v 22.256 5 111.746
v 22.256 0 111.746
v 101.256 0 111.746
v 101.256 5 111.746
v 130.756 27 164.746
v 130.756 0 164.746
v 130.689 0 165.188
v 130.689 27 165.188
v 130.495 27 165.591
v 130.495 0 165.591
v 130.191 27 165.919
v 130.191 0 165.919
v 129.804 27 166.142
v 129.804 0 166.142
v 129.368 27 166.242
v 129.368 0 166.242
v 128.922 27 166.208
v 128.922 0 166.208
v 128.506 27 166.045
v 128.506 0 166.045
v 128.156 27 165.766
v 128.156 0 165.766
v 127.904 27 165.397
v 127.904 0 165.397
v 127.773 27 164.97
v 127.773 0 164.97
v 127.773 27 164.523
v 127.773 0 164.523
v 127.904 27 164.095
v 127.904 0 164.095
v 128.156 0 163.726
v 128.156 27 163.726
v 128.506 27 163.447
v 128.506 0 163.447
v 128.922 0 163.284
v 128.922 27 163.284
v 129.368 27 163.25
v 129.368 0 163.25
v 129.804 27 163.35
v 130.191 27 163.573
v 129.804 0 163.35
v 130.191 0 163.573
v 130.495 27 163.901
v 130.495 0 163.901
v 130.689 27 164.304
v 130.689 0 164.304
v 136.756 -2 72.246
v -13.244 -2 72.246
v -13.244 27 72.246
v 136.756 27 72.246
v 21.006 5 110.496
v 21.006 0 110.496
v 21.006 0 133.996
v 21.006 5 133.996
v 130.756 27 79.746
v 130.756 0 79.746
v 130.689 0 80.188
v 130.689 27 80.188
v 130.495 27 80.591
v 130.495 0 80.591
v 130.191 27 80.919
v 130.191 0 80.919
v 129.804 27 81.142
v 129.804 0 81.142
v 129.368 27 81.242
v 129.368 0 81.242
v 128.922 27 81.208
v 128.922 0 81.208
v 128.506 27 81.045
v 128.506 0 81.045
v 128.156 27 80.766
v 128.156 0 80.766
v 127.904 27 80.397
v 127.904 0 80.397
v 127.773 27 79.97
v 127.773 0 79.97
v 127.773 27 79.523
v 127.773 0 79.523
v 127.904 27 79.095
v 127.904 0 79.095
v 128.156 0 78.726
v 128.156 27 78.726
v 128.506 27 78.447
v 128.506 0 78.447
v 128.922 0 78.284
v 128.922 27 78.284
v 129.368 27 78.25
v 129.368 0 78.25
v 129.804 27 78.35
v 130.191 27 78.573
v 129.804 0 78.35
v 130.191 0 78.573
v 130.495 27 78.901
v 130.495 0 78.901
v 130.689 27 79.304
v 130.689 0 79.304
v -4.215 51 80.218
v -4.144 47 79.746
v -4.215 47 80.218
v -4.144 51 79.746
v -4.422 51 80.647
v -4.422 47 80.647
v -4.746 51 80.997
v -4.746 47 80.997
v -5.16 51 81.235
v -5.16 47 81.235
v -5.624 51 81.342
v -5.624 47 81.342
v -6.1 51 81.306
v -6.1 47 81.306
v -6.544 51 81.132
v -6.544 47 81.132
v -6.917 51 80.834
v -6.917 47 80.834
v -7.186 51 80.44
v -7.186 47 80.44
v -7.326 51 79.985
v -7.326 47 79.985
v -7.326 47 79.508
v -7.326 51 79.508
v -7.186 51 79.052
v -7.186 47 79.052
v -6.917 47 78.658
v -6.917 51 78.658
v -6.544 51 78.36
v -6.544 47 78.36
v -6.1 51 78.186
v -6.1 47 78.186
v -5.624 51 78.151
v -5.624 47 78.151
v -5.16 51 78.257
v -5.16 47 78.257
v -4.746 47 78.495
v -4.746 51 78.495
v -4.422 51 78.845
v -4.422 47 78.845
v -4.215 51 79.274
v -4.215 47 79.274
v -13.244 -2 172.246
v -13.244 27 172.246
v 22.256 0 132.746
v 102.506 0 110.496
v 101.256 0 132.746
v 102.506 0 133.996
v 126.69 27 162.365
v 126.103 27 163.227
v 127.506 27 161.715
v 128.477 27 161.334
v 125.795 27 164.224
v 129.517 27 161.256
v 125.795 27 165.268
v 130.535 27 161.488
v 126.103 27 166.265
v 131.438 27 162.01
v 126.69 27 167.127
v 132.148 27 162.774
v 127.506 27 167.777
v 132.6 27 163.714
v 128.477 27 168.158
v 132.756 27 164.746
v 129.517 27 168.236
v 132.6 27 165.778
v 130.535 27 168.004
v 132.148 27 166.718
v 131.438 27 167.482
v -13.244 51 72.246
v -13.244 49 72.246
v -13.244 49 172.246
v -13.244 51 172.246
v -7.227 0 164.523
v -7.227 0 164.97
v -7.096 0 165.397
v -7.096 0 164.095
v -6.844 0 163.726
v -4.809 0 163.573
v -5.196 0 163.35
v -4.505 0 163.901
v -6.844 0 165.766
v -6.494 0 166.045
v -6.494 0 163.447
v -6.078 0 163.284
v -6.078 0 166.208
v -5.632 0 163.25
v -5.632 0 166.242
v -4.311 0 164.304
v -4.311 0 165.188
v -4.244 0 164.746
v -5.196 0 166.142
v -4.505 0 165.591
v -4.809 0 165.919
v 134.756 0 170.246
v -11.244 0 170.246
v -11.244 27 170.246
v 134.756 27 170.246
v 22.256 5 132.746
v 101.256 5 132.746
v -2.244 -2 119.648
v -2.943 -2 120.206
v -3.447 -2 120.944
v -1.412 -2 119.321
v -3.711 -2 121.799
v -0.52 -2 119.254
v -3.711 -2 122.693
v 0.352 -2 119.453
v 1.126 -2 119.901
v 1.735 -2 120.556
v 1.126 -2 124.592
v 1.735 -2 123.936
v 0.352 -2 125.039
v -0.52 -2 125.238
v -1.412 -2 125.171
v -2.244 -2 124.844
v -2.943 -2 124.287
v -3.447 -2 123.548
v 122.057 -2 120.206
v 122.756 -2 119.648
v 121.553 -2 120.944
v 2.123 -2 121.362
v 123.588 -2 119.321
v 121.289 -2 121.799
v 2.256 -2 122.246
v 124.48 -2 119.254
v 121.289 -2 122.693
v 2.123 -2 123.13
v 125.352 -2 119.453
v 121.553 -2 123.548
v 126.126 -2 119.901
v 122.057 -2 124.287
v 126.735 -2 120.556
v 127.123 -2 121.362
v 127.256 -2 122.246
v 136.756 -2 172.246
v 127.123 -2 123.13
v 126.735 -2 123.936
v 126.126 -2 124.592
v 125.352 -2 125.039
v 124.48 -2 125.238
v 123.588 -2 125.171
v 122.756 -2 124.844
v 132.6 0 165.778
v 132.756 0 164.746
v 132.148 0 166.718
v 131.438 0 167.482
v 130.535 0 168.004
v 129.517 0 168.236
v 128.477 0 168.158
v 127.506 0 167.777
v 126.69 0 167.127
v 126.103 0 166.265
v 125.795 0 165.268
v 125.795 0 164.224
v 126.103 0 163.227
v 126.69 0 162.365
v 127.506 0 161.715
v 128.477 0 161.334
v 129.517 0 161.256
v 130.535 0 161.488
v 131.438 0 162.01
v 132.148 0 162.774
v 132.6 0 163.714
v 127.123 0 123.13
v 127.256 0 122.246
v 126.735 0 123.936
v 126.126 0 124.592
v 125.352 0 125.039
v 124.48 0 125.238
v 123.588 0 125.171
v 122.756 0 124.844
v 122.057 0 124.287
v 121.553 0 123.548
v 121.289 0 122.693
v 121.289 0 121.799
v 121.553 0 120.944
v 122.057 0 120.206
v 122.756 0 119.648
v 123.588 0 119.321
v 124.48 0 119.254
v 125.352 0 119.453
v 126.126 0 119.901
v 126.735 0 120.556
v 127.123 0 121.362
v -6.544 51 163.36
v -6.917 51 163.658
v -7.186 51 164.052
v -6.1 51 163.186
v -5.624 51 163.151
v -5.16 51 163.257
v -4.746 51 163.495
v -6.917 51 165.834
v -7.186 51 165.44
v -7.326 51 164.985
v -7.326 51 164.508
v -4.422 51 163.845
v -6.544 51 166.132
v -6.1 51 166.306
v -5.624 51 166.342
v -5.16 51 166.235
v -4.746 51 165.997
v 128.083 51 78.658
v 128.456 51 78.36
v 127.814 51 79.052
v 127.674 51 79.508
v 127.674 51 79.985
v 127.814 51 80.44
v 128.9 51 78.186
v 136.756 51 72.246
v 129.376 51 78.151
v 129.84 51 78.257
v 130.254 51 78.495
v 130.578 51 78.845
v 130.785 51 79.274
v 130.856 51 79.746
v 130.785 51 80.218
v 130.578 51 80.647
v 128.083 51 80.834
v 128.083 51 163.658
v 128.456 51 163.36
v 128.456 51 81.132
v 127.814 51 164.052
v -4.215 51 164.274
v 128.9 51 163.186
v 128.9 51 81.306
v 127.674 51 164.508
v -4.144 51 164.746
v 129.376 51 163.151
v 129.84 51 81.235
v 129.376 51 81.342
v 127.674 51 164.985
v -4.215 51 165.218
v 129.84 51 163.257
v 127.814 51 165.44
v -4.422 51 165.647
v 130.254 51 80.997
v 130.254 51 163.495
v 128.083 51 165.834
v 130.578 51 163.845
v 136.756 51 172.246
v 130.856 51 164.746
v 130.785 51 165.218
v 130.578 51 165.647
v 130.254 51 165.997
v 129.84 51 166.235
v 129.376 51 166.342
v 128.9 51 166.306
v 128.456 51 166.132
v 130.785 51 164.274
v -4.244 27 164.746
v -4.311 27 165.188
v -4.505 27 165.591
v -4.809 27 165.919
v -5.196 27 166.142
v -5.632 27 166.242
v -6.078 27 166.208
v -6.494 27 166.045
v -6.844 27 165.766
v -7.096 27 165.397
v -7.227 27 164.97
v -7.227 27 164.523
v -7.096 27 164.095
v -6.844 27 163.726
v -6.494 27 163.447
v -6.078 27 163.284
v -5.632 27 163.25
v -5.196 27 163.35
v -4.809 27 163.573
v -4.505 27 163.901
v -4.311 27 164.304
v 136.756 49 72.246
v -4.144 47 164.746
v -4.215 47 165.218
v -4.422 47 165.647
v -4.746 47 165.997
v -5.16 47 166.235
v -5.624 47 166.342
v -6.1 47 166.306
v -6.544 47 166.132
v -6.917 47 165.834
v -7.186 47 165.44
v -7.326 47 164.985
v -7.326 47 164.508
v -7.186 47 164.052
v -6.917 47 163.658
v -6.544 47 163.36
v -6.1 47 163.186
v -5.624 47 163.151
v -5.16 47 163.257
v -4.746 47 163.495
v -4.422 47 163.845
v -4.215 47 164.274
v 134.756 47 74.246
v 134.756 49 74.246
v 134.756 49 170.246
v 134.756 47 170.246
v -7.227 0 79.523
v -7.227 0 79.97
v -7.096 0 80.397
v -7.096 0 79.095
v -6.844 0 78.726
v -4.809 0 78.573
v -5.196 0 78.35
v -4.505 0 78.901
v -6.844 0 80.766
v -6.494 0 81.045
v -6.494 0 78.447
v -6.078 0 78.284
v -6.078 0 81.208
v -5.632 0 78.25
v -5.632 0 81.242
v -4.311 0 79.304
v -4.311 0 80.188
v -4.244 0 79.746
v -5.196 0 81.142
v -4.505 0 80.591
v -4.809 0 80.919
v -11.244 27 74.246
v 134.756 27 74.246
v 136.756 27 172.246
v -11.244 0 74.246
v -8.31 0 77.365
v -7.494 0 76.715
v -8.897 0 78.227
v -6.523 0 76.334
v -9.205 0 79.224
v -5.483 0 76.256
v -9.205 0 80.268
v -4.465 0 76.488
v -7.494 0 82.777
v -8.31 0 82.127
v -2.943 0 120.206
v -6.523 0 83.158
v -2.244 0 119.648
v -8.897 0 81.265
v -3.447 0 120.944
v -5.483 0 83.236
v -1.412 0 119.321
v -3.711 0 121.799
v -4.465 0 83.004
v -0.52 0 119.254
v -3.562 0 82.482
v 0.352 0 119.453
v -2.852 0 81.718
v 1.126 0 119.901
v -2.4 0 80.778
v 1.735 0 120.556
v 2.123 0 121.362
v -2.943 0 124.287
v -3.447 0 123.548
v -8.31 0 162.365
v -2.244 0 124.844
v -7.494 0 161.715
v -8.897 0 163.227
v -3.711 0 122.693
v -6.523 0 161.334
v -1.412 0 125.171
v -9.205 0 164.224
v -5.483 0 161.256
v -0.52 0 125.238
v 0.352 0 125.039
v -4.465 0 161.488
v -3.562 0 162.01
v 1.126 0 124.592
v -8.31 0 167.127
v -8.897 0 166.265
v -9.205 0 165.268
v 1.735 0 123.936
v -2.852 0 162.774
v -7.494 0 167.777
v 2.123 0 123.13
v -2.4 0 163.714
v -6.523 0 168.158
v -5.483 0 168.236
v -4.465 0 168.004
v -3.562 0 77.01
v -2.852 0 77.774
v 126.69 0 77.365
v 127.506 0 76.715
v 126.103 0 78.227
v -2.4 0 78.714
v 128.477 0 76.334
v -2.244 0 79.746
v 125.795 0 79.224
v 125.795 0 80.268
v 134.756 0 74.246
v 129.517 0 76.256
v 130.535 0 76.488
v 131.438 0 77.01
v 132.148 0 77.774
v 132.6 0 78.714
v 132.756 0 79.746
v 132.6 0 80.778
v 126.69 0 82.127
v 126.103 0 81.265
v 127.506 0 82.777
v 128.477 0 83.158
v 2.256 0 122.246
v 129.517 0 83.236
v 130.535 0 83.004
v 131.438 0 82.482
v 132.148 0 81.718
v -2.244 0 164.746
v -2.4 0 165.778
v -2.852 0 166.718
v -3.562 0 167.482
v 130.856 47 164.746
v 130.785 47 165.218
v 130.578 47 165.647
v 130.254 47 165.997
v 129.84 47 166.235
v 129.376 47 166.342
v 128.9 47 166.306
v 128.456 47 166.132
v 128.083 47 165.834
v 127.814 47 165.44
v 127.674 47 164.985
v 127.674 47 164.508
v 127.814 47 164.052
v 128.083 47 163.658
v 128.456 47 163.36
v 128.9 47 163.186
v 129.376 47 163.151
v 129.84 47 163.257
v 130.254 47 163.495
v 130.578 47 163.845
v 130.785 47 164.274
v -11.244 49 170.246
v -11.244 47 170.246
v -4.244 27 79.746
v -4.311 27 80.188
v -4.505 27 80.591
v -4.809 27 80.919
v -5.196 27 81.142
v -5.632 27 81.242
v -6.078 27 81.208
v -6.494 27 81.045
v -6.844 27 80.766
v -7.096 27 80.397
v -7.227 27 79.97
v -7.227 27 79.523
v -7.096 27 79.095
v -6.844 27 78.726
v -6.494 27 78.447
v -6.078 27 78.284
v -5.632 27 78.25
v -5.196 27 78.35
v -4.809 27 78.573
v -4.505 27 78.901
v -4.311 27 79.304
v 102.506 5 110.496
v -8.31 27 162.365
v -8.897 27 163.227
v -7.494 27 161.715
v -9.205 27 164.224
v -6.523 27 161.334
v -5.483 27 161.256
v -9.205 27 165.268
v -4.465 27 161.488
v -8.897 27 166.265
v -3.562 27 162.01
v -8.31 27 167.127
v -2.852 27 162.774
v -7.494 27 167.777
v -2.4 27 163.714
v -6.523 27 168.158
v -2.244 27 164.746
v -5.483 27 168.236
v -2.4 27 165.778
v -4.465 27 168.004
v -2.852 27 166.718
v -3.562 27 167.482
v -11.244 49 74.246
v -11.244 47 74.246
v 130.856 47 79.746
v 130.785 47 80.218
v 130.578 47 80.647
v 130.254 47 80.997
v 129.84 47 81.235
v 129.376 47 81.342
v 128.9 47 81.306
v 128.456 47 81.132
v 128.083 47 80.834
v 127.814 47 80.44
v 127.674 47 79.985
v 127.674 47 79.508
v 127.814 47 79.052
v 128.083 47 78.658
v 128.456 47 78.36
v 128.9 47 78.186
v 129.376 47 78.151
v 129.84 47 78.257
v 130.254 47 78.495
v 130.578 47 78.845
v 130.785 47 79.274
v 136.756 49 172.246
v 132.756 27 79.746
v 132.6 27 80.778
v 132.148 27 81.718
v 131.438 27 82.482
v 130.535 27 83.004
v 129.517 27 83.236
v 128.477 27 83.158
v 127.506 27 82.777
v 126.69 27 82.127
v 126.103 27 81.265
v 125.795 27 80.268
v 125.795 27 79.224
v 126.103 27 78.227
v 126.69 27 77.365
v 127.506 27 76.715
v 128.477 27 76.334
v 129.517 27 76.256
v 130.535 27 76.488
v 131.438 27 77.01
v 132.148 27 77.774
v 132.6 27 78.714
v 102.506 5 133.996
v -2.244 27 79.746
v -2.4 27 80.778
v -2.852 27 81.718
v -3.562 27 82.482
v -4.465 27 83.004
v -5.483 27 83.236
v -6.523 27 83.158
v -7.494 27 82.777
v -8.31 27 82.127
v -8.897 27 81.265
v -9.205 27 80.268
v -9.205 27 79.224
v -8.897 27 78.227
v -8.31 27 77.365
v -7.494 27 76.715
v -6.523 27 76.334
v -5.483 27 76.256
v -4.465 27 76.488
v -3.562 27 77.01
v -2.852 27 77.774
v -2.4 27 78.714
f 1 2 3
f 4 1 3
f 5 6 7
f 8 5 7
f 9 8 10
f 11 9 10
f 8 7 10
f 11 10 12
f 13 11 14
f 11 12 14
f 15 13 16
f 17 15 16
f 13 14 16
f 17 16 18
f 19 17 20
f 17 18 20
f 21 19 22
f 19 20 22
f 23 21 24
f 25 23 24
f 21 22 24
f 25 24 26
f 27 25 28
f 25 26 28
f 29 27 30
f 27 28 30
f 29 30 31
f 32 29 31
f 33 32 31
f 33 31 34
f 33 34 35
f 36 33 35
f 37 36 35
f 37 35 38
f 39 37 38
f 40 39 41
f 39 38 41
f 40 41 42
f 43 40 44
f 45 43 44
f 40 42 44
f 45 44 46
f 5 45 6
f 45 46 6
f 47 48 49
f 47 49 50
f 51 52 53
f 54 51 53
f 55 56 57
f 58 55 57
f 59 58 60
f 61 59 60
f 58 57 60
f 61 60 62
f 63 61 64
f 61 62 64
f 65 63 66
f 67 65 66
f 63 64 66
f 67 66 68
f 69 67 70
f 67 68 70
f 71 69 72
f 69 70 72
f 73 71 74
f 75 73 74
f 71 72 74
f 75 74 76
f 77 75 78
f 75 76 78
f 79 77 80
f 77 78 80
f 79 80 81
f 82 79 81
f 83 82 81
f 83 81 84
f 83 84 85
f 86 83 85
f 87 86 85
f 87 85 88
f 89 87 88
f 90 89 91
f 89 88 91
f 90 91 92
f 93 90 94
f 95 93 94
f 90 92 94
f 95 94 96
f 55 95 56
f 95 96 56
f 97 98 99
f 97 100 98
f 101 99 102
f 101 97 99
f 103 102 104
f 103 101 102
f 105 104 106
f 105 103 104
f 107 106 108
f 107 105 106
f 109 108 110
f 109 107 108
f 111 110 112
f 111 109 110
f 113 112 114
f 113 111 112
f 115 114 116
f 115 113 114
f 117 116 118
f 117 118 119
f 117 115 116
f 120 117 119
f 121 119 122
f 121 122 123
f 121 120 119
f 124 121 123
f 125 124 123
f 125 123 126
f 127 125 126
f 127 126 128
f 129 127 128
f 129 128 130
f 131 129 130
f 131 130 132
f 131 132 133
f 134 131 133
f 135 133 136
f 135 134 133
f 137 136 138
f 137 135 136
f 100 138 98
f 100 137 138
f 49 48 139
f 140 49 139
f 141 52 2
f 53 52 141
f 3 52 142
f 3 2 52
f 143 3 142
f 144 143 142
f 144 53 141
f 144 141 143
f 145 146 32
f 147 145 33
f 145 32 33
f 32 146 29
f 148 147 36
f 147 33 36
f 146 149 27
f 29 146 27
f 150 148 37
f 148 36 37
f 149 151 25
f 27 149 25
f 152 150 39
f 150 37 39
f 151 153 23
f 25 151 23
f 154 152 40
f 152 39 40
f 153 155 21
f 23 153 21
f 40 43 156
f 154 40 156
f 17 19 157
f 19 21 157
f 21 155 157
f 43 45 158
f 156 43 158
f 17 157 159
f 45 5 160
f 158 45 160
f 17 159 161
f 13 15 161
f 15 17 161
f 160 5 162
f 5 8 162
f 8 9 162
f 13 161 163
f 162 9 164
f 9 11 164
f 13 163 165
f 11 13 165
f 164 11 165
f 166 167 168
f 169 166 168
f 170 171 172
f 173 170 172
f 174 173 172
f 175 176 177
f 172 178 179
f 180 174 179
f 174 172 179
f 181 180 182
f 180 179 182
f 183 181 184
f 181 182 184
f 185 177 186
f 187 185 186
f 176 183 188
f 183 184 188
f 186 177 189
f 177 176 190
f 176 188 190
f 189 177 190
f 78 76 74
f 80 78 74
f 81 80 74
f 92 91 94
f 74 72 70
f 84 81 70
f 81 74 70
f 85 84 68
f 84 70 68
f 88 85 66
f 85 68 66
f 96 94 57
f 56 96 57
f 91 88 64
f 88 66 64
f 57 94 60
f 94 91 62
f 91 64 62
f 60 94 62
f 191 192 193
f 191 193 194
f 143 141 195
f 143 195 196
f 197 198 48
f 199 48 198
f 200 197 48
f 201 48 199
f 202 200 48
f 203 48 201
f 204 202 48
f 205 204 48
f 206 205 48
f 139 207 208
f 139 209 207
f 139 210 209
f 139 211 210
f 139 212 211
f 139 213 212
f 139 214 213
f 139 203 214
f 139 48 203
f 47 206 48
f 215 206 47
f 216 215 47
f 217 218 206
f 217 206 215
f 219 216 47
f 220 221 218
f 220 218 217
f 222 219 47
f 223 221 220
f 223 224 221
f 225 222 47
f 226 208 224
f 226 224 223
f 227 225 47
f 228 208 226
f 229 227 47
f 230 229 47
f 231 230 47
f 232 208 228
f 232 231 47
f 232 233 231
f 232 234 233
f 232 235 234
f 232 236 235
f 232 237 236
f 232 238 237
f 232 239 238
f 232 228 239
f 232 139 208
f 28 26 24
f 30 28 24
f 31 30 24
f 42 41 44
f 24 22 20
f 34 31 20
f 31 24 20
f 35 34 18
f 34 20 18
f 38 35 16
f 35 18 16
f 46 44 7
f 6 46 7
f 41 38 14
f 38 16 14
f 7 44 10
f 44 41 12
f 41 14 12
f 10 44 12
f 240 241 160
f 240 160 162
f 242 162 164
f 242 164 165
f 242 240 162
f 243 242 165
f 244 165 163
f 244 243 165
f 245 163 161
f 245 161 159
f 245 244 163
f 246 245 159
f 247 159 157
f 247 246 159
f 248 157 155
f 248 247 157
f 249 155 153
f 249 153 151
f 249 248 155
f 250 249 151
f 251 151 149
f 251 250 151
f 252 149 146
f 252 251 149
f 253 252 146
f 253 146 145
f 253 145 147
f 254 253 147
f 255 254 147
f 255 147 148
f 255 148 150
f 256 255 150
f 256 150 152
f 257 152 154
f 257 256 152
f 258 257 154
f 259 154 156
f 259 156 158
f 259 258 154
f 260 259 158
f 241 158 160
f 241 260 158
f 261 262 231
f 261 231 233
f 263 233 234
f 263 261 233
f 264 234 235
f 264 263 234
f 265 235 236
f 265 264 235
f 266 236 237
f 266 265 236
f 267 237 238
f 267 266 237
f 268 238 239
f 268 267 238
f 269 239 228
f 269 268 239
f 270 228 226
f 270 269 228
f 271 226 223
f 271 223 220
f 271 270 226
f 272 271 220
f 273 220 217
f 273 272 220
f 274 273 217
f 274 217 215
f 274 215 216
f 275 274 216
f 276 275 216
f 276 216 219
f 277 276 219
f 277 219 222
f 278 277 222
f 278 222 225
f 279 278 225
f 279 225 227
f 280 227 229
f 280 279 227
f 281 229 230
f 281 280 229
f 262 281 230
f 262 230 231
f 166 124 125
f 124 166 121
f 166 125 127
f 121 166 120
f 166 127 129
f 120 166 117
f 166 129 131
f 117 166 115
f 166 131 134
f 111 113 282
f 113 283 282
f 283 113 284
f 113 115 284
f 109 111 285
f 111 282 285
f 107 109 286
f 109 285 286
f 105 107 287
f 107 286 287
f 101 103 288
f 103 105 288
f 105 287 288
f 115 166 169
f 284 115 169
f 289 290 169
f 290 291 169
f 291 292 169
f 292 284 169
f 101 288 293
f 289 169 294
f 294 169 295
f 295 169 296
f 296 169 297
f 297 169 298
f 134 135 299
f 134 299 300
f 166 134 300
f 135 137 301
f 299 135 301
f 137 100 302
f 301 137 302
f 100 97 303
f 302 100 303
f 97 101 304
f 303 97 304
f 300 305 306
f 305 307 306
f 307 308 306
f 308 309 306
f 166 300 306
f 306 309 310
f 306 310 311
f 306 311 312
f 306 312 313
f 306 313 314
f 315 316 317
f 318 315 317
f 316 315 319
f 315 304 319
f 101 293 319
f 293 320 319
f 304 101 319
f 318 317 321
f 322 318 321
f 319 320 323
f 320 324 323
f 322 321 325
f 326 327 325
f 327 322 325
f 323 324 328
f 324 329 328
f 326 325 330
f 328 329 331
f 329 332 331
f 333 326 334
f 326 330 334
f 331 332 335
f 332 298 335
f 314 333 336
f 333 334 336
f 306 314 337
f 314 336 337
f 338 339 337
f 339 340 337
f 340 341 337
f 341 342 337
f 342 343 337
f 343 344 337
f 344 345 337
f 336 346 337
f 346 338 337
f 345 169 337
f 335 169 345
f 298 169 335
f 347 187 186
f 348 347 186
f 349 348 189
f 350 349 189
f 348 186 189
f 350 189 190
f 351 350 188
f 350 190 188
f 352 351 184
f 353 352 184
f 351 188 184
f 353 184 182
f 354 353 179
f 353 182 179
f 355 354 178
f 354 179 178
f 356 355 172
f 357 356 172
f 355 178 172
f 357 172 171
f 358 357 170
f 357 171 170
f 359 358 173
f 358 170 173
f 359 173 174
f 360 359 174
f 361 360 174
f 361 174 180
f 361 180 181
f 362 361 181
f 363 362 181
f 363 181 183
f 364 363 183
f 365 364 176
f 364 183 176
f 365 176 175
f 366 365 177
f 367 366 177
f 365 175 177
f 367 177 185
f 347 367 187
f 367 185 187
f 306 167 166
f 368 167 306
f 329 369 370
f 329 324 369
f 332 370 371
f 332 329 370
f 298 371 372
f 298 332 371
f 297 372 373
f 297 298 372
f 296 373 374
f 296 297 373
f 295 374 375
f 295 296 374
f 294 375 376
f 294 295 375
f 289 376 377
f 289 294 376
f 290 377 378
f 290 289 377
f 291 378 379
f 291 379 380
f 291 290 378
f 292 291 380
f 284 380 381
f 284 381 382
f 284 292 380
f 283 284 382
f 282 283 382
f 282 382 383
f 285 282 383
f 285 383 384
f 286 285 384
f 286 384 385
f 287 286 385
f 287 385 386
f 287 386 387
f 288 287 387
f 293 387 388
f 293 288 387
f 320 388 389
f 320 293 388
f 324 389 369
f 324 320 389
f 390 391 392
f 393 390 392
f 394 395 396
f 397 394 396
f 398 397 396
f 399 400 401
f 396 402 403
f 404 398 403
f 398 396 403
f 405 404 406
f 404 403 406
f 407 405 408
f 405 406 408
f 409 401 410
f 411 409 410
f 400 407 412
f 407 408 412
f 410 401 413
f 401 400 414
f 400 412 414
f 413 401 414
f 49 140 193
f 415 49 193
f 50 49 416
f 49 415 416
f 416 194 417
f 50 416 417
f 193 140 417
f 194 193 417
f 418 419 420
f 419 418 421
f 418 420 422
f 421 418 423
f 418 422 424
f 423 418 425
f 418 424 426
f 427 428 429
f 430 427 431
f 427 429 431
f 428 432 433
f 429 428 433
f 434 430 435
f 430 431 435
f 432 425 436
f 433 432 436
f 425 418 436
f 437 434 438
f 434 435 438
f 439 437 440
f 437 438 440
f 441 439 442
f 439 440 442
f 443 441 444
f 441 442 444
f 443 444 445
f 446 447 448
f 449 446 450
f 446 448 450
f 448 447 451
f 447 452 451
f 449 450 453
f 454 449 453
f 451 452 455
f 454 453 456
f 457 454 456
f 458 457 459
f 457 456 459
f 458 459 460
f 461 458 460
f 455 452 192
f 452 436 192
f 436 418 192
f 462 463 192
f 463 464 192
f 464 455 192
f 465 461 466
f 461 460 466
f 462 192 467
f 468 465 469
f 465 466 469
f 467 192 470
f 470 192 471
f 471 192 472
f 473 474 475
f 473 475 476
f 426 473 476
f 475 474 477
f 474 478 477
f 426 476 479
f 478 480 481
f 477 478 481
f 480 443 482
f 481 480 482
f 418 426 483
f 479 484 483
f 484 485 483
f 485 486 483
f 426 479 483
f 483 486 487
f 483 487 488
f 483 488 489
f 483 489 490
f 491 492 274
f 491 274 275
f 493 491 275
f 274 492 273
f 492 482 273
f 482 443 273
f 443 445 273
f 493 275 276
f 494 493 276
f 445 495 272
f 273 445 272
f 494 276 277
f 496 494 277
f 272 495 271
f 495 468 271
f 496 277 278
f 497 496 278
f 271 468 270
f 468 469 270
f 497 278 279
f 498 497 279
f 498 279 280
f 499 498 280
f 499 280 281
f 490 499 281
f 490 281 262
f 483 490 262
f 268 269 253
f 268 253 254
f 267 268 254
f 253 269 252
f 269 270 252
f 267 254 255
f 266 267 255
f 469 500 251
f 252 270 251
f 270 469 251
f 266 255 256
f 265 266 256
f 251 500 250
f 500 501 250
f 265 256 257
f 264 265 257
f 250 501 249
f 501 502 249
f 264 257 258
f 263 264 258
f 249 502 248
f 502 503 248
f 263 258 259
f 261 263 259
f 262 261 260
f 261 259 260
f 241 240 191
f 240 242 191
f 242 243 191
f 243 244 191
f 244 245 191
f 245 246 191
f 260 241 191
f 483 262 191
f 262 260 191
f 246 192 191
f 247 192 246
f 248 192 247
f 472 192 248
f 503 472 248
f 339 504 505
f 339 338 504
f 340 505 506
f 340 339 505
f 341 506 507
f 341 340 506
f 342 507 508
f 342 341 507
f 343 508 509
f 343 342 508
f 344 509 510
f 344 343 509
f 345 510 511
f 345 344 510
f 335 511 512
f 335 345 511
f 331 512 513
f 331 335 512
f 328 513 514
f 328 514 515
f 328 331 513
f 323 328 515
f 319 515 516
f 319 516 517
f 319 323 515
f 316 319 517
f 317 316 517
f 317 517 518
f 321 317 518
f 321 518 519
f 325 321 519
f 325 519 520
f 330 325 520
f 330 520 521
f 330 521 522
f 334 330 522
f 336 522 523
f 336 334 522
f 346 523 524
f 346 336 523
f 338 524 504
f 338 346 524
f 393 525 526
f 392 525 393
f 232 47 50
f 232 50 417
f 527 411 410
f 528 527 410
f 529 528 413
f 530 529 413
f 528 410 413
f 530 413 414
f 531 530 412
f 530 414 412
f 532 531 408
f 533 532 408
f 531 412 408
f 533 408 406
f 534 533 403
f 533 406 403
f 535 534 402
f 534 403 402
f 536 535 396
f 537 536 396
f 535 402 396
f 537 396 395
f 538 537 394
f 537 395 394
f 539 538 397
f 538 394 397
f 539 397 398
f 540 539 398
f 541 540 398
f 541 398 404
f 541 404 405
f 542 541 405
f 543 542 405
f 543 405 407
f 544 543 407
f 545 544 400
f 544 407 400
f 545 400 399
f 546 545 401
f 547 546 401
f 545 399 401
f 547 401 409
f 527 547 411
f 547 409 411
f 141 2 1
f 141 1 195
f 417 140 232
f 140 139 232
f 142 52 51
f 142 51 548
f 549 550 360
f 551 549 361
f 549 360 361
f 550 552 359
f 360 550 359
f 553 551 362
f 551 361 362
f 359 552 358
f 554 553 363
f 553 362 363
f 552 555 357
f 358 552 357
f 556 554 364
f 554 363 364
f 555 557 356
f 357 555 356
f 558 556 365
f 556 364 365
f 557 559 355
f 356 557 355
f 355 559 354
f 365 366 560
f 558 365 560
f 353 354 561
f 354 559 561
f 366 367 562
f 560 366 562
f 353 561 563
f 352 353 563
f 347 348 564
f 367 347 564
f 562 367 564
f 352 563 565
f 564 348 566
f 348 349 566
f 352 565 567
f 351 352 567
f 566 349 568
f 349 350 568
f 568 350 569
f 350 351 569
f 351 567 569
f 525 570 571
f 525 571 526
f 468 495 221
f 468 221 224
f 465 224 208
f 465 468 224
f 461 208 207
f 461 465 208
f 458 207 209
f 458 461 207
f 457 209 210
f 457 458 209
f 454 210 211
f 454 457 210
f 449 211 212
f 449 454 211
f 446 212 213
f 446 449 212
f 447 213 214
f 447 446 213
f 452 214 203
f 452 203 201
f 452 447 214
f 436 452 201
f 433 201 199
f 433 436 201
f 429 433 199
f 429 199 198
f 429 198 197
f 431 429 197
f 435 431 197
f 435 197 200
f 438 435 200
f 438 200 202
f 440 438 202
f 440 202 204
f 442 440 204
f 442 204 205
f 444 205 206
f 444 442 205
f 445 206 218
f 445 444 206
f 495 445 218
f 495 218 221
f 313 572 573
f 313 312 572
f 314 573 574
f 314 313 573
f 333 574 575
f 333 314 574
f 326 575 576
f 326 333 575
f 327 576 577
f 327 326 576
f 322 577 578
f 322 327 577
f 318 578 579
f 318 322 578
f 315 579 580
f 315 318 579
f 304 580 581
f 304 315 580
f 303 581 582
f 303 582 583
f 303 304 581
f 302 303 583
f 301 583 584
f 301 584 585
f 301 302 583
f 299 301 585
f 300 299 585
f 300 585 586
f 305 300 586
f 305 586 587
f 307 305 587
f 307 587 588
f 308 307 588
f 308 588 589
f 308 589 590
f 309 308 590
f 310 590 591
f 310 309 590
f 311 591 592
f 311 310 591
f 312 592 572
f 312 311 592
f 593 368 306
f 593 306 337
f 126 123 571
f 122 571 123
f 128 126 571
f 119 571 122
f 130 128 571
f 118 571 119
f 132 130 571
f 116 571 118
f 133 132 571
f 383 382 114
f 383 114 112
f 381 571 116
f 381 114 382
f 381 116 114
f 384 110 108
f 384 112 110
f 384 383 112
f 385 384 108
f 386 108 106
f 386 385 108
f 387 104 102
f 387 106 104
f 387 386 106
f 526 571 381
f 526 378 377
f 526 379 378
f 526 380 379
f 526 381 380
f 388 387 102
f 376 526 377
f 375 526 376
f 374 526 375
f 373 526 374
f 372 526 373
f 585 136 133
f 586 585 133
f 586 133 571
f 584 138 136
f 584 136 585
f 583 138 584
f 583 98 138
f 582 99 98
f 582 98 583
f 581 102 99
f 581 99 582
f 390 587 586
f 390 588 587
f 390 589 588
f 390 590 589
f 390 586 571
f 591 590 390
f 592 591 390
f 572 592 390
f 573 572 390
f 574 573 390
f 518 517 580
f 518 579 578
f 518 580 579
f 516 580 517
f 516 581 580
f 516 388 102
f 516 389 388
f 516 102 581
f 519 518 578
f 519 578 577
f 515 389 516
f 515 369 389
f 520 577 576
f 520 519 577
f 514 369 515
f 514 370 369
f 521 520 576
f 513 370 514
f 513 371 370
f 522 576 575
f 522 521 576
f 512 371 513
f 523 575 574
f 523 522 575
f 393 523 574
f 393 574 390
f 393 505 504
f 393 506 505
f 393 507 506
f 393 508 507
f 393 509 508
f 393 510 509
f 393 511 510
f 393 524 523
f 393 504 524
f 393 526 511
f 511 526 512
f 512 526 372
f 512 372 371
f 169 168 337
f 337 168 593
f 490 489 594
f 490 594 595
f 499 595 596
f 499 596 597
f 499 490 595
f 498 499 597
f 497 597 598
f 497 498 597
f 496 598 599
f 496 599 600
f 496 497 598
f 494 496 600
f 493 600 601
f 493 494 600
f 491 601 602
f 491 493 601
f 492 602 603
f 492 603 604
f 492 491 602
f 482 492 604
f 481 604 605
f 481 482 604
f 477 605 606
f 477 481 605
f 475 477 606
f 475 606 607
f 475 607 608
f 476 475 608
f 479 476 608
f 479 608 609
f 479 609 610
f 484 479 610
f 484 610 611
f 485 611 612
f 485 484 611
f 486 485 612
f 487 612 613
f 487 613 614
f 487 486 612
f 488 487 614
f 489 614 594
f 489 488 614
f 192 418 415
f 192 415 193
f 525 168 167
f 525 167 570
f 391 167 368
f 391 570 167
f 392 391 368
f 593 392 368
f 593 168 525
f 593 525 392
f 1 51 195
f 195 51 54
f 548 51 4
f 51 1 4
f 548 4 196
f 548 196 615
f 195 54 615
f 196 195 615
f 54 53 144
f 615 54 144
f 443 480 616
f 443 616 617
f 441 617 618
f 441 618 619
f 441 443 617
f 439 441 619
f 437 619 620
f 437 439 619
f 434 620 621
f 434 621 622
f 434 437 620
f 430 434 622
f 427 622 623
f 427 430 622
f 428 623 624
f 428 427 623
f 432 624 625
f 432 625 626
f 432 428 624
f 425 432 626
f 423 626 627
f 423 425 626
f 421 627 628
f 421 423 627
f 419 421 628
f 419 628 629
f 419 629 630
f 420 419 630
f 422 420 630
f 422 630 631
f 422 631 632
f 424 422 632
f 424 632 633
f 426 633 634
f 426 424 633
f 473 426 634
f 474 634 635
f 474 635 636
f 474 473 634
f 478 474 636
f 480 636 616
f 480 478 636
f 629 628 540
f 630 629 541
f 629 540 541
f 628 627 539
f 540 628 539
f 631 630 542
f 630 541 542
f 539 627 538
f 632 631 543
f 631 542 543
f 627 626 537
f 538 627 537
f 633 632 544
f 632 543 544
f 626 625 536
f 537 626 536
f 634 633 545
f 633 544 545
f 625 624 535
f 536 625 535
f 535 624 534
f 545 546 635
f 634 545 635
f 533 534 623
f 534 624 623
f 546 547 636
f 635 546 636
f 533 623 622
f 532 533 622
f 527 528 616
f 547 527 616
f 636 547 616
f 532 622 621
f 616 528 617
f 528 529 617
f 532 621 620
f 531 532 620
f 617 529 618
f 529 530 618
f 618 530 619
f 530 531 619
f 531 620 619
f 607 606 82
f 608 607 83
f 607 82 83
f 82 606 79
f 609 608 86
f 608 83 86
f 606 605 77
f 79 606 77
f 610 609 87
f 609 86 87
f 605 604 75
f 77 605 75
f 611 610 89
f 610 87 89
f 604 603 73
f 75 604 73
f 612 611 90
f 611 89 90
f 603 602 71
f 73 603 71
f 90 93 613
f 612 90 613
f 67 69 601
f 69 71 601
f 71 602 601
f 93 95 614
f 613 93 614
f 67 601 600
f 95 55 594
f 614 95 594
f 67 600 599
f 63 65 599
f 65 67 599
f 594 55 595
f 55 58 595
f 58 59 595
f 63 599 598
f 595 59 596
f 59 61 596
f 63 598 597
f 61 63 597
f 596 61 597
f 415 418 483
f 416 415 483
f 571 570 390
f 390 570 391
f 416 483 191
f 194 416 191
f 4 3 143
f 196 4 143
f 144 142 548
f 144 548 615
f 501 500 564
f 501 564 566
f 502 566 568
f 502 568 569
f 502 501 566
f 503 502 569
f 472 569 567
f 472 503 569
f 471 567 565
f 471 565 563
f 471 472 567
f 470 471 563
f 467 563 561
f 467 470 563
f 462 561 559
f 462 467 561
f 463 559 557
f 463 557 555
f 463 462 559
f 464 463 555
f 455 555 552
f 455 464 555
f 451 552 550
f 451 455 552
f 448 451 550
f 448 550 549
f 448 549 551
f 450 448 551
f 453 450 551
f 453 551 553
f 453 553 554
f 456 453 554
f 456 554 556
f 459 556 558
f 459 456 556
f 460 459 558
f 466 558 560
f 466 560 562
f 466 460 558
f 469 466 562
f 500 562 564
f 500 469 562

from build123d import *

# Parameters (mm, degrees)
F0_W     = 81.5
F0_H     = 23.5
F0_W_2   = 79
F0_H_2   = 21
F1_DEPTH = 5
F0_W_3   = 150
F0_H_3   = 100
F0_W_4   = 146
F0_H_4   = 96
F0_R     = 3.5
F0_R_2   = 3
F0_R_3   = 1.5
F2_DEPTH = 2
F3_DEPTH = 27
F5_W     = 150
F5_H     = 100
F5_W_2   = 146
F5_H_2   = 96
F5_R     = 1.6
F6_DEPTH = 2
F7_DEPTH = 2


# Not quite as in the source:
# - a feature of the source that left no trace in its solid (it failed there, or was rolled back) is left out


with BuildPart() as f1:
    # F0 (on Front) → F1 (new body)
    with BuildSketch(Plane.XZ):
        with Locations((61.7559325695, 122.2460778952)):
            Rectangle(F0_W, F0_H)
        with Locations((61.7559325695, 122.2460778952)):
            Rectangle(F0_W_2, F0_H_2, mode=Mode.SUBTRACT)
    extrude(amount=-F1_DEPTH)


with BuildPart() as f2:
    # F0 (on Front) → F2 (new body)
    with BuildSketch(Plane.XZ):
        with Locations((61.7559325695, 122.2460778952)):
            Rectangle(F0_W_3, F0_H_3)
        with Locations((61.7559325695, 122.2460778952)):
            Rectangle(F0_W_4, F0_H_4, mode=Mode.SUBTRACT)
        with Locations((61.7559325695, 122.2460778952)):
            Rectangle(F0_W_4, F0_H_4)
        with Locations((-5.7440674305, 79.7460778952)):
            Circle(F0_R, mode=Mode.SUBTRACT)
        with Locations((61.7559325695, 122.2460778952)):
            Rectangle(F0_W, F0_H, mode=Mode.SUBTRACT)
        with Locations((129.2559325695, 79.7460778952)):
            Circle(F0_R, mode=Mode.SUBTRACT)
        with Locations((-0.7440674305, 122.2460778952)):
            Circle(F0_R_2, mode=Mode.SUBTRACT)
        with Locations((-5.7440674305, 164.7460778952)):
            Circle(F0_R, mode=Mode.SUBTRACT)
        with Locations((124.2559325695, 122.2460778952)):
            Circle(F0_R_2, mode=Mode.SUBTRACT)
        with Locations((129.2559325695, 164.7460778952)):
            Circle(F0_R, mode=Mode.SUBTRACT)
        with Locations((61.7559325695, 122.2460778952)):
            Rectangle(F0_W, F0_H)
        with Locations((61.7559325695, 122.2460778952)):
            Rectangle(F0_W_2, F0_H_2, mode=Mode.SUBTRACT)
        with Locations((61.7559325695, 122.2460778952)):
            Rectangle(F0_W_2, F0_H_2)
        with Locations((-5.7440674305, 79.7460778952)):
            Circle(F0_R)
        with Locations((-5.7440674305, 79.7460778952)):
            Circle(F0_R_3, mode=Mode.SUBTRACT)
        with Locations((129.2559325695, 164.7460778952)):
            Circle(F0_R)
        with Locations((129.2559325695, 164.7460778952)):
            Circle(F0_R_3, mode=Mode.SUBTRACT)
        with Locations((129.2559325695, 79.7460778952)):
            Circle(F0_R)
        with Locations((129.2559325695, 79.7460778952)):
            Circle(F0_R_3, mode=Mode.SUBTRACT)
        with Locations((-5.7440674305, 164.7460778952)):
            Circle(F0_R)
        with Locations((-5.7440674305, 164.7460778952)):
            Circle(F0_R_3, mode=Mode.SUBTRACT)
        with Locations((-5.7440674305, 79.7460778952)):
            Circle(F0_R_3)
        with Locations((129.2559325695, 164.7460778952)):
            Circle(F0_R_3)
        with Locations((129.2559325695, 79.7460778952)):
            Circle(F0_R_3)
        with Locations((-5.7440674305, 164.7460778952)):
            Circle(F0_R_3)
    extrude(amount=F2_DEPTH)

    # F0 (on Front) → F3 (join)
    with BuildSketch(Plane.XZ):
        with Locations((61.7559325695, 122.2460778952)):
            Rectangle(F0_W_3, F0_H_3)
        with Locations((61.7559325695, 122.2460778952)):
            Rectangle(F0_W_4, F0_H_4, mode=Mode.SUBTRACT)
        with Locations((129.2559325695, 164.7460778952)):
            Circle(F0_R)
        with Locations((129.2559325695, 164.7460778952)):
            Circle(F0_R_3, mode=Mode.SUBTRACT)
        with Locations((-5.7440674305, 164.7460778952)):
            Circle(F0_R)
        with Locations((-5.7440674305, 164.7460778952)):
            Circle(F0_R_3, mode=Mode.SUBTRACT)
        with Locations((-5.7440674305, 79.7460778952)):
            Circle(F0_R)
        with Locations((-5.7440674305, 79.7460778952)):
            Circle(F0_R_3, mode=Mode.SUBTRACT)
        with Locations((129.2559325695, 79.7460778952)):
            Circle(F0_R)
        with Locations((129.2559325695, 79.7460778952)):
            Circle(F0_R_3, mode=Mode.SUBTRACT)
    extrude(amount=-F3_DEPTH)


with BuildPart() as f6:
    # F5 (on offset) → F6 (new body)
    with BuildSketch(Plane.XZ.offset(-49)):
        with Locations((61.7559325695, 122.2460778952)):
            Rectangle(F5_W, F5_H)
        with Locations((61.7559325695, 122.2460778952)):
            Rectangle(F5_W_2, F5_H_2, mode=Mode.SUBTRACT)
        with Locations((61.7559325695, 122.2460778952)):
            Rectangle(F5_W_2, F5_H_2)
        with Locations((-5.7440674305, 79.7460778952)):
            Circle(F5_R, mode=Mode.SUBTRACT)
        with Locations((129.2559325695, 79.7460778952)):
            Circle(F5_R, mode=Mode.SUBTRACT)
        with Locations((-5.7440674305, 164.7460778952)):
            Circle(F5_R, mode=Mode.SUBTRACT)
        with Locations((129.2559325695, 164.7460778952)):
            Circle(F5_R, mode=Mode.SUBTRACT)
    extrude(amount=-F6_DEPTH)

    # F5 (on offset) → F7 (join)
    with BuildSketch(Plane.XZ.offset(-49)):
        with Locations((61.7559325695, 122.2460778952)):
            Rectangle(F5_W_2, F5_H_2)
        with Locations((-5.7440674305, 79.7460778952)):
            Circle(F5_R, mode=Mode.SUBTRACT)
        with Locations((129.2559325695, 79.7460778952)):
            Circle(F5_R, mode=Mode.SUBTRACT)
        with Locations((-5.7440674305, 164.7460778952)):
            Circle(F5_R, mode=Mode.SUBTRACT)
        with Locations((129.2559325695, 164.7460778952)):
            Circle(F5_R, mode=Mode.SUBTRACT)
    extrude(amount=F7_DEPTH)


solid = Compound([f1.part, f2.part, f6.part])
